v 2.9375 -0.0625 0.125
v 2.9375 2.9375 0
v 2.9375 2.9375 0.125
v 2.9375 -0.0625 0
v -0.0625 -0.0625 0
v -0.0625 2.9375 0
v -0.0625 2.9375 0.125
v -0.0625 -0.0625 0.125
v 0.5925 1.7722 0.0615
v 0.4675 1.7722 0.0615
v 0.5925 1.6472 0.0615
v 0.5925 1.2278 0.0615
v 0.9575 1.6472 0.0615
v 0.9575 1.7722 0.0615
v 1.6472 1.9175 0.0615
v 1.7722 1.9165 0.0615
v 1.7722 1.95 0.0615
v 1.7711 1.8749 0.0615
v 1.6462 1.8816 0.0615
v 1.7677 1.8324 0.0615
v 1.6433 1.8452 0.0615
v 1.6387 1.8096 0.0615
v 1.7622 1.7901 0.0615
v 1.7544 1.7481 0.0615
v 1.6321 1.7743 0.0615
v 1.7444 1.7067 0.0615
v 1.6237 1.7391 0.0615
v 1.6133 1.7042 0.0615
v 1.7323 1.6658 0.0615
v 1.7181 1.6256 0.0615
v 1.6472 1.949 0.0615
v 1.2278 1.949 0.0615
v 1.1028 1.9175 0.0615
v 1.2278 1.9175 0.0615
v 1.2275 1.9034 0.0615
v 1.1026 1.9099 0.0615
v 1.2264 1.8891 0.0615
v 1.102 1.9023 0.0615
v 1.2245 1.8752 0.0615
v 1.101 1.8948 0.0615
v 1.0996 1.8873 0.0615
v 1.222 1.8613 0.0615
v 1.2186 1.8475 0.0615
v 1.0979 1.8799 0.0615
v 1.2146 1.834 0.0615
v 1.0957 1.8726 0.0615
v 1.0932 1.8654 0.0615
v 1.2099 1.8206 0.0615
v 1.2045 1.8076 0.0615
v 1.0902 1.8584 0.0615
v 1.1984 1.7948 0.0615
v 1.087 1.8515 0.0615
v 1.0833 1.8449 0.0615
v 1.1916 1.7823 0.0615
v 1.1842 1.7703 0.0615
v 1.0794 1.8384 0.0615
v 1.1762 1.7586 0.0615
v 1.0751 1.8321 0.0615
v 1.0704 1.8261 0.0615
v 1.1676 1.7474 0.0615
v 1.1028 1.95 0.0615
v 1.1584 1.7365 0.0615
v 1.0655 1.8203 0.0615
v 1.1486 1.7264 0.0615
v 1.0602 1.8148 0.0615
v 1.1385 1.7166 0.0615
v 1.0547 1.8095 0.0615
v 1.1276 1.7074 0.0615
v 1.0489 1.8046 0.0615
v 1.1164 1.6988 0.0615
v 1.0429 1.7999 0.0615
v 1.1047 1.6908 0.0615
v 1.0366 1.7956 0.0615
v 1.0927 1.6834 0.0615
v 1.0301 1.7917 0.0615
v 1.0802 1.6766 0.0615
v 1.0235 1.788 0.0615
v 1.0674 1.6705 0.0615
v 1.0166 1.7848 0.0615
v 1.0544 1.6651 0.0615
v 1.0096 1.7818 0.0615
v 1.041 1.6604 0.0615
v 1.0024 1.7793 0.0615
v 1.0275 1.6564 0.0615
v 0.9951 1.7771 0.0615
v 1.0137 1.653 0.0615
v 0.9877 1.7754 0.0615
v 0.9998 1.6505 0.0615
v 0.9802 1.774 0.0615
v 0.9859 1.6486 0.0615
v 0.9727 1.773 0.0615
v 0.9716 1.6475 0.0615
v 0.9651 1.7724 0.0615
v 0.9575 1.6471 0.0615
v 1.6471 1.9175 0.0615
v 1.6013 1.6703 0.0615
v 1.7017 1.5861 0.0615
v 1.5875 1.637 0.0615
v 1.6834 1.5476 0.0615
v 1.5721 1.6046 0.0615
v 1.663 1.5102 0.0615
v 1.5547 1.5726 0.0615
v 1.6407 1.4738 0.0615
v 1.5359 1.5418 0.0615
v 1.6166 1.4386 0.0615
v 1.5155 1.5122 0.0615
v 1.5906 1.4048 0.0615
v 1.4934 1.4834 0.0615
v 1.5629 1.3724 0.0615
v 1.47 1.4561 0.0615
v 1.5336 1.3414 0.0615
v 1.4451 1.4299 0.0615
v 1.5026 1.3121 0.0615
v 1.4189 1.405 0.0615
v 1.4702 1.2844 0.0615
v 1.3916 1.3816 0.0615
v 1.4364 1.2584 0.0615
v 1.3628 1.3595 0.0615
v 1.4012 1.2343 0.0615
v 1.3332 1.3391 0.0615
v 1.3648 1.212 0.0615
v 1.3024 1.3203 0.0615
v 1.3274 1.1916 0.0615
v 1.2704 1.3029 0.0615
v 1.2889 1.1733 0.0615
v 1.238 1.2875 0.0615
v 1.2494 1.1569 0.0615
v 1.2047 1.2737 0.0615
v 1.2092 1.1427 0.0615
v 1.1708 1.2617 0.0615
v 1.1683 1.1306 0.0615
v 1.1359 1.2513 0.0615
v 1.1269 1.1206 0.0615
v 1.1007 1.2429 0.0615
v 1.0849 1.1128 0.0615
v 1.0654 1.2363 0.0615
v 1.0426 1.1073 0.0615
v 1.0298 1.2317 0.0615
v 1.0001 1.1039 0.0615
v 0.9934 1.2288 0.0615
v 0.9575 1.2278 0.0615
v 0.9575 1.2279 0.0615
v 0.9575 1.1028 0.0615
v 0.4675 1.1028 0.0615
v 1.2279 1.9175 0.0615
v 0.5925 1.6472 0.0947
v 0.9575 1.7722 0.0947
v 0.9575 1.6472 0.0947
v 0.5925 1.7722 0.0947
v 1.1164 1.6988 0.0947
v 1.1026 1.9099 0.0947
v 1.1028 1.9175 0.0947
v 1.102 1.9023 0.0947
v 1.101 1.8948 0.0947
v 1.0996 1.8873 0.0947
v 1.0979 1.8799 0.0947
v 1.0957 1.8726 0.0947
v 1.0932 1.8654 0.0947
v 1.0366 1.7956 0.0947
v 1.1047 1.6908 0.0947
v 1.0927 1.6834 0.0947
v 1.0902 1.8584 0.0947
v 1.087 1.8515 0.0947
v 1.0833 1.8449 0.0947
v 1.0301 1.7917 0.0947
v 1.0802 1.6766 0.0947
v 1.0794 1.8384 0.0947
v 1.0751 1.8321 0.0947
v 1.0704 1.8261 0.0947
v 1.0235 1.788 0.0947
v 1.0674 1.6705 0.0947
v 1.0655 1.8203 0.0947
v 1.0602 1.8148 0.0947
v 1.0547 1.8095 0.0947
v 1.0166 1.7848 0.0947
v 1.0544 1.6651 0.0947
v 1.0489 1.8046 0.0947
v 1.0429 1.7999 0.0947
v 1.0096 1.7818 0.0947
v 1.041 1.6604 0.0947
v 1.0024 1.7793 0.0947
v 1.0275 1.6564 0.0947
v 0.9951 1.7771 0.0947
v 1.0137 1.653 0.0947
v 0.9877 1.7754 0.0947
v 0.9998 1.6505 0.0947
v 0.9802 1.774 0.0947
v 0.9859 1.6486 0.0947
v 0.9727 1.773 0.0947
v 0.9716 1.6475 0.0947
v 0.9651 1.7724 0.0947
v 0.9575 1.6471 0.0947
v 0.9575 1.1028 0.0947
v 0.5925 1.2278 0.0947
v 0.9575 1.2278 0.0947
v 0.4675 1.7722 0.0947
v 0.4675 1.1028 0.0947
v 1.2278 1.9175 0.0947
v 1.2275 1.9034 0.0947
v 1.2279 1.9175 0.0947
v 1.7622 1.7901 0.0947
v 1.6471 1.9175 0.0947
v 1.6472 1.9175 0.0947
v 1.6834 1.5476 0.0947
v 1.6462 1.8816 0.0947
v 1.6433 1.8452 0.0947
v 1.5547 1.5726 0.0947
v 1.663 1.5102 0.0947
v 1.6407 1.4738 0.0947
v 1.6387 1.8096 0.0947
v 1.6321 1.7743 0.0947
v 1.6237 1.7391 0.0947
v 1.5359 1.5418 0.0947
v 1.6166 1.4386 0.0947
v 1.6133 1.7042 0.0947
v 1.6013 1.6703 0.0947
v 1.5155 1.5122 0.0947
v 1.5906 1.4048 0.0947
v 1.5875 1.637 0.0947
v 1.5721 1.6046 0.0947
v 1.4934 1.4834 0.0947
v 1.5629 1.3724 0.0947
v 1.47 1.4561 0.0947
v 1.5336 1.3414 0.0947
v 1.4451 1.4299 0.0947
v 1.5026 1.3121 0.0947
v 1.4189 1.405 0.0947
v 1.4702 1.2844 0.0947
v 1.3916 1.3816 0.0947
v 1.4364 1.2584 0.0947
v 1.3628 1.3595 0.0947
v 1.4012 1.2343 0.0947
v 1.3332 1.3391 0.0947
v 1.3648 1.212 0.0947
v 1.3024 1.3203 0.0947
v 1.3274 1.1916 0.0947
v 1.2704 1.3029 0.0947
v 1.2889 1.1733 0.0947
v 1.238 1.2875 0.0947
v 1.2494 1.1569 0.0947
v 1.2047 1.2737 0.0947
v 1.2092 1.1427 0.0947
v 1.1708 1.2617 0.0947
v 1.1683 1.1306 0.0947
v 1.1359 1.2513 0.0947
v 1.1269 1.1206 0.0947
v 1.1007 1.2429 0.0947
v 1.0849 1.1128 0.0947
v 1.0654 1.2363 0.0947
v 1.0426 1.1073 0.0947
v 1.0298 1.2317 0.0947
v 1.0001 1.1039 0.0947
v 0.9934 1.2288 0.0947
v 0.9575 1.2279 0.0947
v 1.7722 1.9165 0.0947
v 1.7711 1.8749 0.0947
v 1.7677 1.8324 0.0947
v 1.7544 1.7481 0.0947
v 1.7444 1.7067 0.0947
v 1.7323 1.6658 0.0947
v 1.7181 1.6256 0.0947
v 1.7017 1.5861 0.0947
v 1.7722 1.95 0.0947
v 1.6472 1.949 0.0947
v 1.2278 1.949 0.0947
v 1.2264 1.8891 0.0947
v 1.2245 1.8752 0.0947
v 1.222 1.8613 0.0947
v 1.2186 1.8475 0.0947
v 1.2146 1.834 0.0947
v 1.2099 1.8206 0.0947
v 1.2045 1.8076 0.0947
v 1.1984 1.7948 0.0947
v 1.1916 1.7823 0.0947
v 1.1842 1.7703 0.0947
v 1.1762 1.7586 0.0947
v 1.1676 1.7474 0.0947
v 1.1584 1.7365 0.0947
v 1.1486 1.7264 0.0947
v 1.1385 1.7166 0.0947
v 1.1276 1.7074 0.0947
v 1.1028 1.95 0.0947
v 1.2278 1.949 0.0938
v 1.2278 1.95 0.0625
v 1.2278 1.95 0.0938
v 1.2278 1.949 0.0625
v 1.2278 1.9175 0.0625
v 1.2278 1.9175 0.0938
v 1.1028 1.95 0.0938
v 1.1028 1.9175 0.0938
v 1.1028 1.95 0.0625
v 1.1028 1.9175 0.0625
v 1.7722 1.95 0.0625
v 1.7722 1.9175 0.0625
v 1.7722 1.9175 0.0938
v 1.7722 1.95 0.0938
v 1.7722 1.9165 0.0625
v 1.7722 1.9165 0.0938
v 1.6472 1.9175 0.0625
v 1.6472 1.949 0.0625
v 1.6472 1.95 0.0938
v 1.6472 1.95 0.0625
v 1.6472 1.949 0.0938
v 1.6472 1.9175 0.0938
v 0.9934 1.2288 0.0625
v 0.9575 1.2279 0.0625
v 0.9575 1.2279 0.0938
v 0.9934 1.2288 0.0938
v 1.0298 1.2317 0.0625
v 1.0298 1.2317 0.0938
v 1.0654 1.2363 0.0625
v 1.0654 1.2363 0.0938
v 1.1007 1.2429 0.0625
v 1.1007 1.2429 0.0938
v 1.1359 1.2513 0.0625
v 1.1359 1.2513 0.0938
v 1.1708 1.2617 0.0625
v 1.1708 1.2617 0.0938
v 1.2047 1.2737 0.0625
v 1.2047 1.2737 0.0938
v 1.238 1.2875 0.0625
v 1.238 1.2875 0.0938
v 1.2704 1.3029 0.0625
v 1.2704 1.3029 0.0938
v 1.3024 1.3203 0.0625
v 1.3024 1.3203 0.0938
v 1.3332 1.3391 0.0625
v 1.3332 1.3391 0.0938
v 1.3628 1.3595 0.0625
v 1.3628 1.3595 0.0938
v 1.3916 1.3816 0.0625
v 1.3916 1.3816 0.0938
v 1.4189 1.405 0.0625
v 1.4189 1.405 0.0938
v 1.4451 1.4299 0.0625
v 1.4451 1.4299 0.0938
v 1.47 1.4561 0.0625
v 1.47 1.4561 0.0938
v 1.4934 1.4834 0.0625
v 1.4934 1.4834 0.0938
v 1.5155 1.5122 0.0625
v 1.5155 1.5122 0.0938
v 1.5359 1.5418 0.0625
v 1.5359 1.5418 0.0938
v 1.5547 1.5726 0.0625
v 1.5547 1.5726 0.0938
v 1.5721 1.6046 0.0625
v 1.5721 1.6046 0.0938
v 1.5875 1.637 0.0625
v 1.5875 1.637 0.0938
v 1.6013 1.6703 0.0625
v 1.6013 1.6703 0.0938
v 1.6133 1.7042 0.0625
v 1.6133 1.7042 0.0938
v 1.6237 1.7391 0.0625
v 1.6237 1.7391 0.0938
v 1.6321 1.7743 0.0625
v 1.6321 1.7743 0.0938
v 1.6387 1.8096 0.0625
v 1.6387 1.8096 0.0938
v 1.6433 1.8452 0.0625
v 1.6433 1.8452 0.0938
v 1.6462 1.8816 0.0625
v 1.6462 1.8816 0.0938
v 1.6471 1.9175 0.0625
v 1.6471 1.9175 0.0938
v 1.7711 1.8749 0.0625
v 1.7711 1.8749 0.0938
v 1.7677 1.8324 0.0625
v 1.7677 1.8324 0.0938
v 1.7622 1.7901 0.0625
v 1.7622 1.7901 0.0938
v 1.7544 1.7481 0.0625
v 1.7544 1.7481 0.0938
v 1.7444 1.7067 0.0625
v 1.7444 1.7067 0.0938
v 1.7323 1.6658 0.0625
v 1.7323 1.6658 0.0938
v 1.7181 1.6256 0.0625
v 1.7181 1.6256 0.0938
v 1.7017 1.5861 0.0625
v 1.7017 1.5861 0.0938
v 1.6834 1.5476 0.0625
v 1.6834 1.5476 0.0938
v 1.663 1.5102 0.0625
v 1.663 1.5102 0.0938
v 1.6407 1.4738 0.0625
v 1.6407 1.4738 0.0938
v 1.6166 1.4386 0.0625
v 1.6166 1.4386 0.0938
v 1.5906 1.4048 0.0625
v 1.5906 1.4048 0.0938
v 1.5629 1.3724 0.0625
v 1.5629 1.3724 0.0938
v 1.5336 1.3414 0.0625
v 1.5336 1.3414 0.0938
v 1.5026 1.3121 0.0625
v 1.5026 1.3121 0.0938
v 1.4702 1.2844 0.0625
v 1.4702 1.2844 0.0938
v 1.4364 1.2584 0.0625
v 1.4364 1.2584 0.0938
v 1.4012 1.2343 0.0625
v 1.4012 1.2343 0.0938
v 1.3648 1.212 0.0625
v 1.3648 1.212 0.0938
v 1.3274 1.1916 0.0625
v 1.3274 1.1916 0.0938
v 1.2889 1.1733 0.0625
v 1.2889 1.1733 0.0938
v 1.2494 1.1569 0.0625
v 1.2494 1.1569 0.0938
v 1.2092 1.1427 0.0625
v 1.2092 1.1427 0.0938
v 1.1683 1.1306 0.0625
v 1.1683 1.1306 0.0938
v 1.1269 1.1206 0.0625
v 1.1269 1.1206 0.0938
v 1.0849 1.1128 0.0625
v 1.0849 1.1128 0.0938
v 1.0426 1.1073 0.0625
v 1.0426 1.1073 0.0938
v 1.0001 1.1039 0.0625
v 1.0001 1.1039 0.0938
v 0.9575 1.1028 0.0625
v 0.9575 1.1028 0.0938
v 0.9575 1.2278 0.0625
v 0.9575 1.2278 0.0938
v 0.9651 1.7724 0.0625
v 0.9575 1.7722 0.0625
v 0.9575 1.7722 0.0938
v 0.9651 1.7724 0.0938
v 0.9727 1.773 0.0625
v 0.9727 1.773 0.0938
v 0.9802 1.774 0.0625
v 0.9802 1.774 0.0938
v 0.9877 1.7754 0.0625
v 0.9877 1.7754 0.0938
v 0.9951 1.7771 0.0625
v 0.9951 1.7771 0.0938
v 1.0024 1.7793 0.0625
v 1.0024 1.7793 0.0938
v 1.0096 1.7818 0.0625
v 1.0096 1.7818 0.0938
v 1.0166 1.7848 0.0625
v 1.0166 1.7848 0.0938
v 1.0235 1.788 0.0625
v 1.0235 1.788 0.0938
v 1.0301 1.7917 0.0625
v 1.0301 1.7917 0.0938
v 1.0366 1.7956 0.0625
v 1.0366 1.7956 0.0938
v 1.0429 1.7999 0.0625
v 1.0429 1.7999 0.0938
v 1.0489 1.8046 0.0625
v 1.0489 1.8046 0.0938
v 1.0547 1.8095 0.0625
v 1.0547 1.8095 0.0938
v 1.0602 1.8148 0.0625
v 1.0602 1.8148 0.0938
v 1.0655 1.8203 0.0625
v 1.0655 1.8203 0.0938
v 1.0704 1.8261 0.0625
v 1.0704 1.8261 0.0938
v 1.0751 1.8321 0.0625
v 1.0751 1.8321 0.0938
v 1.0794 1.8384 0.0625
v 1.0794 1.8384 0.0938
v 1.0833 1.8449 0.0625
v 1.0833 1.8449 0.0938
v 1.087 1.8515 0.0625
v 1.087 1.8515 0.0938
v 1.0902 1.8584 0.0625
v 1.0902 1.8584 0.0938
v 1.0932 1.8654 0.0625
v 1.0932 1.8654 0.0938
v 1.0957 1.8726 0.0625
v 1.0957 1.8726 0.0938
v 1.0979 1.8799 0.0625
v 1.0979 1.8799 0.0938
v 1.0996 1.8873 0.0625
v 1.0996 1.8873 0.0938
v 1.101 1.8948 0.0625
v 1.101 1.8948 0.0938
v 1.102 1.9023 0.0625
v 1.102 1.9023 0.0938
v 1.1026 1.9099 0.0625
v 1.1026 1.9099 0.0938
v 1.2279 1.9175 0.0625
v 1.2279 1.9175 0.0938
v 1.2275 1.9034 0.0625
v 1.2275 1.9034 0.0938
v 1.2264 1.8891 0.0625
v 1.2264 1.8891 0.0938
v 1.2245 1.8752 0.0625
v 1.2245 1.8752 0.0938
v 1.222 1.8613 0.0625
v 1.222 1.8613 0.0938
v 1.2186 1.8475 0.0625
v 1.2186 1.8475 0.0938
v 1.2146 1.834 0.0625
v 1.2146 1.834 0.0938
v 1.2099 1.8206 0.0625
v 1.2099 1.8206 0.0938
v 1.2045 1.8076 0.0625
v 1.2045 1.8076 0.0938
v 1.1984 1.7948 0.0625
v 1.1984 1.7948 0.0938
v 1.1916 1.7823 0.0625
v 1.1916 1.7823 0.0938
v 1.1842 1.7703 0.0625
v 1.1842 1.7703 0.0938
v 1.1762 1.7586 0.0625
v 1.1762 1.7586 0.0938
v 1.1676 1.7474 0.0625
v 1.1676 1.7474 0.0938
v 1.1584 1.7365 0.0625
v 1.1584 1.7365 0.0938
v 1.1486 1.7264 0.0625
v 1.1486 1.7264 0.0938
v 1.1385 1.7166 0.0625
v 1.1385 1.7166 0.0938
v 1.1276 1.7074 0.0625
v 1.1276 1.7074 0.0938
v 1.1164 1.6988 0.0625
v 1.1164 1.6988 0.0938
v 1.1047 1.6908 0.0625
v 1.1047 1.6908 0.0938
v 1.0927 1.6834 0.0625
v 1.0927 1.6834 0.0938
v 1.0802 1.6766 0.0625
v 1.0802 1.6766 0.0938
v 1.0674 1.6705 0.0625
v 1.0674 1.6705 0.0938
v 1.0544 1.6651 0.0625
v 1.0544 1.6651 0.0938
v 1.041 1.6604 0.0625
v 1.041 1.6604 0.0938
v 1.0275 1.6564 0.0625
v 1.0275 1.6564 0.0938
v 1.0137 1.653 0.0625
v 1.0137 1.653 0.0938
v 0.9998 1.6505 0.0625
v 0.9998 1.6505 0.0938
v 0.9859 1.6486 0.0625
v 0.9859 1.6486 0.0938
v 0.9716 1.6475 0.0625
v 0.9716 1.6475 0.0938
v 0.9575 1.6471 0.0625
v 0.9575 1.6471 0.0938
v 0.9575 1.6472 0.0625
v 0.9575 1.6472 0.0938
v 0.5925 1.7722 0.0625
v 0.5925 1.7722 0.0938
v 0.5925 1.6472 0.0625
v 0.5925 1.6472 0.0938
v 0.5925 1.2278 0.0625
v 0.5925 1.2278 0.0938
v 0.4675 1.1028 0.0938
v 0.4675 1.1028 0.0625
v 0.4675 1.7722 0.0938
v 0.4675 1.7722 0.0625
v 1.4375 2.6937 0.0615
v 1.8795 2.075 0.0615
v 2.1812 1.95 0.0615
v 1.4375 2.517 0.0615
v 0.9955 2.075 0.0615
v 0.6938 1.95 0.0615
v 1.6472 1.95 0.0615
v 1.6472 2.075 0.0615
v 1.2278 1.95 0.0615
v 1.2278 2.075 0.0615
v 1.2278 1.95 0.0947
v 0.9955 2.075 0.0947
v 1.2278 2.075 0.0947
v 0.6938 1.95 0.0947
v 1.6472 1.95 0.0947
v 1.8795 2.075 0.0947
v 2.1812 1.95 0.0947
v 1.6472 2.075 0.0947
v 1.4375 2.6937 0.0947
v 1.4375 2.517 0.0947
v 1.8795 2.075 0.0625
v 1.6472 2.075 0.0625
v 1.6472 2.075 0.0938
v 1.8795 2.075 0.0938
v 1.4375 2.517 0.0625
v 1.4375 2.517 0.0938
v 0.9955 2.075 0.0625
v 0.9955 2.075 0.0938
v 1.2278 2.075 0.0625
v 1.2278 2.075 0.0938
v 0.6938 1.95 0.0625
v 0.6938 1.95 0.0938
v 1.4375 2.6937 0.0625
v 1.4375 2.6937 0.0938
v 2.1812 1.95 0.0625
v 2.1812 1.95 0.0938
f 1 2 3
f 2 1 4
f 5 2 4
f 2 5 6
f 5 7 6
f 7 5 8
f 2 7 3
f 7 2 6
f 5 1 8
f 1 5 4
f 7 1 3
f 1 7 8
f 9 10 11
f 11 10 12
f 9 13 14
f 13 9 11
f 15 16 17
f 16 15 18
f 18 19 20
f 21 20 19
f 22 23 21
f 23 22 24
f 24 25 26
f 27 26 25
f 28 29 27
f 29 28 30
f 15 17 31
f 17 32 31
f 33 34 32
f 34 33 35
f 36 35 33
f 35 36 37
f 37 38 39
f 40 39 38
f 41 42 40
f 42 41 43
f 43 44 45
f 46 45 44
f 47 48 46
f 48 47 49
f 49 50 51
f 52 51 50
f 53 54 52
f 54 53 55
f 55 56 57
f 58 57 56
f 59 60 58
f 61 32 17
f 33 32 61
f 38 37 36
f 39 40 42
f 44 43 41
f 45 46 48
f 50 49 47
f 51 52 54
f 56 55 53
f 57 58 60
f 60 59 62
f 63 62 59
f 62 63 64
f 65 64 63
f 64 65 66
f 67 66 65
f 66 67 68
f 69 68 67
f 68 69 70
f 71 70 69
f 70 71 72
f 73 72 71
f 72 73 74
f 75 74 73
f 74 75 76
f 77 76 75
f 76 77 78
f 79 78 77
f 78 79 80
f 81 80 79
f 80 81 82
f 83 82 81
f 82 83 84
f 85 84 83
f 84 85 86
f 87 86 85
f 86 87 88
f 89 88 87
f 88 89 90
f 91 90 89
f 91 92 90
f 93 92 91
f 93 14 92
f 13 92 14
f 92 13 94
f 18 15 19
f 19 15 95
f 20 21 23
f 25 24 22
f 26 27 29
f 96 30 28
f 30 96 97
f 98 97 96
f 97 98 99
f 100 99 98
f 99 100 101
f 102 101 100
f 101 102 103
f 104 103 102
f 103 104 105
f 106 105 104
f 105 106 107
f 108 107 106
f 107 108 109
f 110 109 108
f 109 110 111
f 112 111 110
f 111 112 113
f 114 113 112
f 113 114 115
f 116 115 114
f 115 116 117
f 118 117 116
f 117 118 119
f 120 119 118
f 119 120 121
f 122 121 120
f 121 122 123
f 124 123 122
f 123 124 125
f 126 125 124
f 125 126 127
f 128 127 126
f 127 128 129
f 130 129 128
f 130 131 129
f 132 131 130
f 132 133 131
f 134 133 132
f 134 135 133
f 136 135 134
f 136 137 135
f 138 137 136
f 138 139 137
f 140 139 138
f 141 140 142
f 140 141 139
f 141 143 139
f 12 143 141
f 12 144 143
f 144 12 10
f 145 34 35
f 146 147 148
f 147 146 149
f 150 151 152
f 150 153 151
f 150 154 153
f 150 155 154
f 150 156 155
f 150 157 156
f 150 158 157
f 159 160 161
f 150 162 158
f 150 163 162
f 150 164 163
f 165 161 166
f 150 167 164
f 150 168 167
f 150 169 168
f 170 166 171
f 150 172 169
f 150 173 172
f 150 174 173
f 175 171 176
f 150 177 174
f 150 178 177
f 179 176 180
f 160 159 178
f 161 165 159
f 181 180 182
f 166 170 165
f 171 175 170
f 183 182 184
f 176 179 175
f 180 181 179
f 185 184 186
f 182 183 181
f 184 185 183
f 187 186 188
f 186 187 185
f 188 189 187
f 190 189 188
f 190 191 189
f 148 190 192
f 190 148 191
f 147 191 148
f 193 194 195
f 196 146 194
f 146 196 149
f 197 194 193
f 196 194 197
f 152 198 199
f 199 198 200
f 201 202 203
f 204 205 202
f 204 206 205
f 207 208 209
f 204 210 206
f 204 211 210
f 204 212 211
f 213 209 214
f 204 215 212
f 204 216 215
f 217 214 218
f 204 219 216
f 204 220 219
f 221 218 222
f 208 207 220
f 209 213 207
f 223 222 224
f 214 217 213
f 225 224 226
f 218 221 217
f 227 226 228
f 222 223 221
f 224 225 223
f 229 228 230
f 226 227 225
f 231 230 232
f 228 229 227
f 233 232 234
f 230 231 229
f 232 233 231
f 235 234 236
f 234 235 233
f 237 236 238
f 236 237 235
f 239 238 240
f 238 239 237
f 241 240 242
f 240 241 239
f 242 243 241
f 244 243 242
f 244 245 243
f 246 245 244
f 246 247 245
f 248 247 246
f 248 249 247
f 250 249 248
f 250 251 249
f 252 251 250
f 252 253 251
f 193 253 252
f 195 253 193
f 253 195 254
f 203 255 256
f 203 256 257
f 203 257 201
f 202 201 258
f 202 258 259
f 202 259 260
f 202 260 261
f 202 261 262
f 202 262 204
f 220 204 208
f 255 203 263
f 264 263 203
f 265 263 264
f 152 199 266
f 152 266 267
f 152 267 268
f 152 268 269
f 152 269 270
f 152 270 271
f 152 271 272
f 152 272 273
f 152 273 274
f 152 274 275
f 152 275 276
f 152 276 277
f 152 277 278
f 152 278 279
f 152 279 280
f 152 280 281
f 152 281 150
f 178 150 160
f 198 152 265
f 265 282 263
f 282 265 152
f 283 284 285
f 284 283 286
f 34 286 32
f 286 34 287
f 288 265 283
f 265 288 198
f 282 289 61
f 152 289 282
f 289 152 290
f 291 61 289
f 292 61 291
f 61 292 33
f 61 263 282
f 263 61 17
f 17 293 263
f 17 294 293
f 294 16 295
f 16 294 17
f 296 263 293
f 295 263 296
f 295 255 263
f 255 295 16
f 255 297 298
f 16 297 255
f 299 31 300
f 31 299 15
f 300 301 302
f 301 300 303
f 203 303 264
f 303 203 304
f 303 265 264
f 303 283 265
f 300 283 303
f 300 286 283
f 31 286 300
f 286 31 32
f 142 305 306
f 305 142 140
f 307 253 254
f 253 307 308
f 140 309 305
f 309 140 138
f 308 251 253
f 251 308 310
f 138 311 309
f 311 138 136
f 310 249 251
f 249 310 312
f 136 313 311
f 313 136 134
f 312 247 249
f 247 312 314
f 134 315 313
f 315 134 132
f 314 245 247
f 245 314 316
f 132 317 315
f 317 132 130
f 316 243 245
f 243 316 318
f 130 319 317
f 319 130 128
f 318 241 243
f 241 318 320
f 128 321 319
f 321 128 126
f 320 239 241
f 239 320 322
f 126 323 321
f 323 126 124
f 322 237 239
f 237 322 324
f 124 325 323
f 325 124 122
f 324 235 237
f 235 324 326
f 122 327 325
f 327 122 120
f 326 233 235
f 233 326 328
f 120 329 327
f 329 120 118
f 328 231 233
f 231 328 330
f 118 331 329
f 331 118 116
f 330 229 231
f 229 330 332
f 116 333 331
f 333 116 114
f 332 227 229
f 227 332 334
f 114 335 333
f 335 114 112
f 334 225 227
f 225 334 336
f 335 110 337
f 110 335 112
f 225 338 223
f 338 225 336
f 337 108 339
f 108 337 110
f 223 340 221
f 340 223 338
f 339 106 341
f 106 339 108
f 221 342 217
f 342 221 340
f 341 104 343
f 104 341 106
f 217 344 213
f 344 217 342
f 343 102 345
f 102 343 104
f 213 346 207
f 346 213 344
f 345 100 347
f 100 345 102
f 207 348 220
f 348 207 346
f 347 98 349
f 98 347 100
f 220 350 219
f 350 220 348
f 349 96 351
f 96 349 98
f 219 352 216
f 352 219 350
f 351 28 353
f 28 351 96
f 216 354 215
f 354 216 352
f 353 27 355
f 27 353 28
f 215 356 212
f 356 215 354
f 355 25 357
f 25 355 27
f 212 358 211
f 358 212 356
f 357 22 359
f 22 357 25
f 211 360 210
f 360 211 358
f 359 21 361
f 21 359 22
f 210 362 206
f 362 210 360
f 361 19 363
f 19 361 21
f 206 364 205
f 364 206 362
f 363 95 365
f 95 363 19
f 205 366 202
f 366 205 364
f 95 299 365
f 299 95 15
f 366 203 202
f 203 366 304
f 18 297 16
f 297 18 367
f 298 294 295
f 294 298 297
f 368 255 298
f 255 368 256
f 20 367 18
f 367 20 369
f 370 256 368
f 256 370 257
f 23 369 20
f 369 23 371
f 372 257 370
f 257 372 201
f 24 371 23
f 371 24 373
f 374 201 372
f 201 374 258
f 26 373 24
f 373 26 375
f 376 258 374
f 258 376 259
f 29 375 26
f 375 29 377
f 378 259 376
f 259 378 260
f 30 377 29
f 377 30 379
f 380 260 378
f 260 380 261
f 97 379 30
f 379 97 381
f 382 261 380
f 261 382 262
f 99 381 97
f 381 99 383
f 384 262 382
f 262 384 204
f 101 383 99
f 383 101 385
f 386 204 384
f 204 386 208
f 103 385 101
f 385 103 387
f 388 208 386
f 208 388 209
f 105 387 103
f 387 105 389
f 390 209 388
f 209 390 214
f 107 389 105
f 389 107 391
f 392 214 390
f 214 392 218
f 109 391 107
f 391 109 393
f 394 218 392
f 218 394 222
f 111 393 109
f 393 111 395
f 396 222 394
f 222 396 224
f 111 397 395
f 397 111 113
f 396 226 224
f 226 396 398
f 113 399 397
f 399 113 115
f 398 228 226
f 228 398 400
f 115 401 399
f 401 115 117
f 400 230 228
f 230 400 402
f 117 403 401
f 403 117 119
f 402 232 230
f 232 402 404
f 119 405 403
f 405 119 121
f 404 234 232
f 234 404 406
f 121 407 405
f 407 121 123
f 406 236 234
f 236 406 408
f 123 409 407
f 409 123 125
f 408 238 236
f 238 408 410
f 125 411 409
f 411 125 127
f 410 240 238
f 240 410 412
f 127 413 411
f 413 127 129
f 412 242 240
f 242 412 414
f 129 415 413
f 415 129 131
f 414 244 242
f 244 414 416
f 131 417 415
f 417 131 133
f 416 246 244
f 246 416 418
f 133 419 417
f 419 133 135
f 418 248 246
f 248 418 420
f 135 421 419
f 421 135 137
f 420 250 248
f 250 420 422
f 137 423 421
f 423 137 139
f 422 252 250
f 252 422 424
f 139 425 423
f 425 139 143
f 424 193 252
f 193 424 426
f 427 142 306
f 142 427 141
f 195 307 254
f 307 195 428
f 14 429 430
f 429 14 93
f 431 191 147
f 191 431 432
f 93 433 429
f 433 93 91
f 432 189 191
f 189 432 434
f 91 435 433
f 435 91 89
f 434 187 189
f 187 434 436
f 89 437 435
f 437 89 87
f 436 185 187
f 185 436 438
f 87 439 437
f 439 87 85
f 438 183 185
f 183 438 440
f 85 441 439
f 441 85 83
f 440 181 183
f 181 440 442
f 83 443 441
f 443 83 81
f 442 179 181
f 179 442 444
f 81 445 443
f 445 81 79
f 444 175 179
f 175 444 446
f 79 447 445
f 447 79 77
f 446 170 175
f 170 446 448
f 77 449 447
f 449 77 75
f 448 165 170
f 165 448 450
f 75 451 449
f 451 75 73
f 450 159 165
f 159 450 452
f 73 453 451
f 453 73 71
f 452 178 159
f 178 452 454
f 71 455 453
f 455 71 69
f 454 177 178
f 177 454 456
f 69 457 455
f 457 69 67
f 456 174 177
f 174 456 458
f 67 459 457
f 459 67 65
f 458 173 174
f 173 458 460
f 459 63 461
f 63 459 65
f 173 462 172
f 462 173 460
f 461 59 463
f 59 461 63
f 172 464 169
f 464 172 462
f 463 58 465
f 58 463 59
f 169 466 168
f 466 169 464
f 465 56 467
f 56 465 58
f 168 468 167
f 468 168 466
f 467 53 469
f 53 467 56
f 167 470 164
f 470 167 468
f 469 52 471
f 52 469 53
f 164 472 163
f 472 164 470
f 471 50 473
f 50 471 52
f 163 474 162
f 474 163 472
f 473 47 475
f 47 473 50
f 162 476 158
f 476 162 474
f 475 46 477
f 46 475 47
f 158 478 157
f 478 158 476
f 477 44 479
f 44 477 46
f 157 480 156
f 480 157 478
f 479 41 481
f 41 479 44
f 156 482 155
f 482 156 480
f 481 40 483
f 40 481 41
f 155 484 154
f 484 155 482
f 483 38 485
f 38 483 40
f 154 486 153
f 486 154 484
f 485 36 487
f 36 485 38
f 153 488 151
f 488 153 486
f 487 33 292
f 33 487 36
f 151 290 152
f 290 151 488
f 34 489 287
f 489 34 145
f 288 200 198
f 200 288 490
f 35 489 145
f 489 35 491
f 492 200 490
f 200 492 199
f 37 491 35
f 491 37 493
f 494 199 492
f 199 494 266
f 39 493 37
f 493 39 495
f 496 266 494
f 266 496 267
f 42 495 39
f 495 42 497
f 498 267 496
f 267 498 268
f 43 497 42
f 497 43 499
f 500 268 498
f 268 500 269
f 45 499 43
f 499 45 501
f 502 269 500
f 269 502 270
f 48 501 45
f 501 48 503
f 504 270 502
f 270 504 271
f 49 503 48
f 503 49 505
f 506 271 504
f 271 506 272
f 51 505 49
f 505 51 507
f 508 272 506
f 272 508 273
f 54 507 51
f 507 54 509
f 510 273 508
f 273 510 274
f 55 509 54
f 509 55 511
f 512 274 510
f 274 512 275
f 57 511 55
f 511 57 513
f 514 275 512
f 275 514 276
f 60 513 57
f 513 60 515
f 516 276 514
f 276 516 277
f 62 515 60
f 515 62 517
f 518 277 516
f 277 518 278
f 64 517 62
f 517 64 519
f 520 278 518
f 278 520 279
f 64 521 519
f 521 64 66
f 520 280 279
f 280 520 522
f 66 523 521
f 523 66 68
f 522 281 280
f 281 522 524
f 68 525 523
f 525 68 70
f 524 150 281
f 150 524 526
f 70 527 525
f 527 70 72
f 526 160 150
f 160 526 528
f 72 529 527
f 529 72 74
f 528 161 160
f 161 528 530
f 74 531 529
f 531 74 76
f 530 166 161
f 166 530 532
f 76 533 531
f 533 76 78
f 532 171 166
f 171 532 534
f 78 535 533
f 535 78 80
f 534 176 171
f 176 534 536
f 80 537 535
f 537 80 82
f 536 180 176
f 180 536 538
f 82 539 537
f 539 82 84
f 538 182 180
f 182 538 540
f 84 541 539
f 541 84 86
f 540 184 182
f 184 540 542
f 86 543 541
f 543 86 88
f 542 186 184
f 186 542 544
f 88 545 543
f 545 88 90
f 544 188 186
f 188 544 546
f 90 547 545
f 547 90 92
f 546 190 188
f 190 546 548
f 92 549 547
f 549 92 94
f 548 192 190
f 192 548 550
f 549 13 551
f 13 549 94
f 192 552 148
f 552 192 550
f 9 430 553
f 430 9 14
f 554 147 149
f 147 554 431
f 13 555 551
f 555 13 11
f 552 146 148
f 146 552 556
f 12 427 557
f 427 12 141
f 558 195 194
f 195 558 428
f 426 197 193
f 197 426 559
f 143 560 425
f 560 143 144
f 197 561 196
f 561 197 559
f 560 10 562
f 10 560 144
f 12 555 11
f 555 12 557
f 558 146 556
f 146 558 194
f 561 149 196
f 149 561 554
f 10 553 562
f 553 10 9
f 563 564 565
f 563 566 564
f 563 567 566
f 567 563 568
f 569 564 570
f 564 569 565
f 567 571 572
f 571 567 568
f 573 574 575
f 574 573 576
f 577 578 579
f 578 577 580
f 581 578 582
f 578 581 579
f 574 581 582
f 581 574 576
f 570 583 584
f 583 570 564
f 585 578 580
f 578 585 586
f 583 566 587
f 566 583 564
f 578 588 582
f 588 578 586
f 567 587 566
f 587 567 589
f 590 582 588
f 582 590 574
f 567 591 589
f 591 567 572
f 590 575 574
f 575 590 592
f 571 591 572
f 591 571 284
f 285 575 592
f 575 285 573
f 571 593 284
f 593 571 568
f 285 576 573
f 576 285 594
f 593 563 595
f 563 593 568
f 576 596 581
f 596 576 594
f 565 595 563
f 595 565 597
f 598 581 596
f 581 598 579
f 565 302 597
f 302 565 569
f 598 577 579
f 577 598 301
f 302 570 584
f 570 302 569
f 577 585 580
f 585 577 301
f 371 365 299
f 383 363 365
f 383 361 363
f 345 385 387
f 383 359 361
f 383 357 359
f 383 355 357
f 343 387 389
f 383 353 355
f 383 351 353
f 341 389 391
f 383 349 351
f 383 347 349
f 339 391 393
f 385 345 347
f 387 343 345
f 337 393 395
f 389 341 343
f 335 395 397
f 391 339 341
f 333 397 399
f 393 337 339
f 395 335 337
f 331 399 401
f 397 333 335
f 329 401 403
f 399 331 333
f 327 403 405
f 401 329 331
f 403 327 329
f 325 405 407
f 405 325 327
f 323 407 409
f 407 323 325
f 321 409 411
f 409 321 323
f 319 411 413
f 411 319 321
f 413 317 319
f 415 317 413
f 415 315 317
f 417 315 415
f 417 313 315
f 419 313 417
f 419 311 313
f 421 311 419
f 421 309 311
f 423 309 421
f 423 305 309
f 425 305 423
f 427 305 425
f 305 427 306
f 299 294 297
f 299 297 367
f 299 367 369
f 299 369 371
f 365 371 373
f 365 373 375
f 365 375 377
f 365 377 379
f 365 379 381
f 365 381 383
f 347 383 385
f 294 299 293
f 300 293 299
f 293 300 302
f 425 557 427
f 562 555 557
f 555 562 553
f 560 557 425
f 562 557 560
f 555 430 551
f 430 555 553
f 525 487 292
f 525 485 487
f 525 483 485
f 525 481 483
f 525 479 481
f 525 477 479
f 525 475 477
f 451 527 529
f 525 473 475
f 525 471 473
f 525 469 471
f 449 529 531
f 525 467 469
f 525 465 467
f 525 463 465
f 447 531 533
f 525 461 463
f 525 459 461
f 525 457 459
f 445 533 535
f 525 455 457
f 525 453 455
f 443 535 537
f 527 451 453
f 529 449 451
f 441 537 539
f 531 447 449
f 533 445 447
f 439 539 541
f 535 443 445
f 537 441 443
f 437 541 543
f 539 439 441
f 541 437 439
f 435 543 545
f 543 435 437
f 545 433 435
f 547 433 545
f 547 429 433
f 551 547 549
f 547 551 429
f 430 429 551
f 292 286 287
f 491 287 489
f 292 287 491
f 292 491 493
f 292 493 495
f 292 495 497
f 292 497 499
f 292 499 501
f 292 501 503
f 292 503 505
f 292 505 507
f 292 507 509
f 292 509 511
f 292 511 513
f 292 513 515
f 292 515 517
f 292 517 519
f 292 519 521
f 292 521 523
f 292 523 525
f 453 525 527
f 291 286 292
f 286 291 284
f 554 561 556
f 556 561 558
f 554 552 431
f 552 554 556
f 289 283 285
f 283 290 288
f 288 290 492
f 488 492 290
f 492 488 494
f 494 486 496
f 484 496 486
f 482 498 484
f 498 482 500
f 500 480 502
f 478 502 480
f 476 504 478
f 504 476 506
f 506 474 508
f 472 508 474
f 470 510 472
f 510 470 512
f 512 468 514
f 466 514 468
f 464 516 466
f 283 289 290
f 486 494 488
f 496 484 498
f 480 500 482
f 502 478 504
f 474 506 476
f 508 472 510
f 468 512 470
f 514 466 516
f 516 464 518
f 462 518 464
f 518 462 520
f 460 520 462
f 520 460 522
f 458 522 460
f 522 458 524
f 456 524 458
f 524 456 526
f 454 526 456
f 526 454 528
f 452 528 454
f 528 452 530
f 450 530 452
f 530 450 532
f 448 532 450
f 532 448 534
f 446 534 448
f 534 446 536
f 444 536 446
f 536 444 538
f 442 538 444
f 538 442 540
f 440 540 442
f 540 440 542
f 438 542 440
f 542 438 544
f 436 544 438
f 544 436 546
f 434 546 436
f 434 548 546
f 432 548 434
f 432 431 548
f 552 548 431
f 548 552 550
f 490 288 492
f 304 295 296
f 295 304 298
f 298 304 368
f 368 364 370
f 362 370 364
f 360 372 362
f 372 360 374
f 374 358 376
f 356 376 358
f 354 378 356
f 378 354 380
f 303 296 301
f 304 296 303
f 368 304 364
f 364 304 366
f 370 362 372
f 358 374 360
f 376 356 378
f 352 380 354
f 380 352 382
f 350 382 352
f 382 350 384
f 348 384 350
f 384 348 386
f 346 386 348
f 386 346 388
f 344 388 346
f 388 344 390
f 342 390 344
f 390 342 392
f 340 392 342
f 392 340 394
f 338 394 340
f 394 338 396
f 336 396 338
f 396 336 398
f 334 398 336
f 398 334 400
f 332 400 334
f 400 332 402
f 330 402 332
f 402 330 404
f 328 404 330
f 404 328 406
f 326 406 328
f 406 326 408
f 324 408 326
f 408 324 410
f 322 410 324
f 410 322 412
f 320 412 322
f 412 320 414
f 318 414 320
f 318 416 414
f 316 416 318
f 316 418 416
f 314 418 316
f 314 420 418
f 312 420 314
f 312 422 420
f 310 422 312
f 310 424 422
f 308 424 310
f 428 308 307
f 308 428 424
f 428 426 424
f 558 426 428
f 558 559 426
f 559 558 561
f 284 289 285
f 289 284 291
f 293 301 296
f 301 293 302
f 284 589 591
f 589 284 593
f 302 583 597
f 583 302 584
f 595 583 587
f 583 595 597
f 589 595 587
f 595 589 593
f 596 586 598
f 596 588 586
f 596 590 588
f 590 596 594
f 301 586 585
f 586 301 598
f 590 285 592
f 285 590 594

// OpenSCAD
// file: sub_water_base_plate.scad
// sub_water_base_plate.scad — base plate for the "water" tile family
// (element55 straight, future right-turn/left-turn variants)
// Units: inches
//
// Unlike sub_base_plate.scad's single darkgray plate, this family stacks the
// top pattern_h-plus a bit into three visible layers, bottom to top:
//   darkgray          — 1/2 plate_h  (structural base)
//   background_color  — 1/4 plate_h  (caller-defined)
//   transparent_color — 1/4 plate_h  (caller-defined, spans the outer
//                                      footprint — frame included — so it
//                                      caps the border too)
// Rivets run through darkgray + background_color only (3/4 plate_h) — the
// transparent_color cap sits over them uncut. frame_with_id() is built to
// that same 3/4 plate_h, so its top 1/4 is covered by the transparent cap
// exactly like the inner plate. The arrow (sub_water_arrows.scad) is
// unaffected — it still lives in its own top pattern_h slice, which happens
// to be the same pattern_h as the transparent_color layer at current
// dimensions, but is not derived from it.

plate_w = 2 + 7/8;
plate_d = 2 + 7/8;
plate_h = 1/8; // full plate thickness
frame_w = 1/16;
hole_d  = 3/32;
hole_r  = hole_d / 2;

pattern_h = 1/32;  // thickness of the arrow's top slice (sub_water_arrows.scad) —
                   // independent of the layer fractions below even though it
                   // currently equals plate_h/4.
id_cover = plate_h * 3 / 16;

// ── Layer heights ───────────────────────────────────────────────────────
darkgray_h    = plate_h / 2;
background_h  = plate_h / 4;
transparent_h = plate_h / 4;
frame_h       = plate_h * 3 / 4;               // = darkgray_h + background_h
rivet_depth   = darkgray_h + background_h;     // rivets stop where the transparent cap starts

module rivet_holes() {
    spacing_x = plate_w / 10;
    spacing_y = plate_d / 10;
    inset_x   = spacing_x / 2;
    inset_y   = spacing_y / 2;
    for (i = [0:9]) translate([inset_x + i * spacing_x, inset_y,           -1]) cylinder(h = rivet_depth + 2, r = hole_r, $fn = 20);
    for (i = [0:9]) translate([inset_x + i * spacing_x, plate_d - inset_y, -1]) cylinder(h = rivet_depth + 2, r = hole_r, $fn = 20);
    for (i = [0:9]) translate([inset_x,           inset_y + i * spacing_y, -1]) cylinder(h = rivet_depth + 2, r = hole_r, $fn = 20);
    for (i = [0:9]) translate([plate_w - inset_x, inset_y + i * spacing_y, -1]) cylinder(h = rivet_depth + 2, r = hole_r, $fn = 20);
}

module rivets() {
    spacing_x = plate_w / 10;
    spacing_y = plate_d / 10;
    inset_x   = spacing_x / 2;
    inset_y   = spacing_y / 2;
    color("lightgray") {
        for (i = [0:9]) translate([inset_x + i * spacing_x, inset_y,           0]) cylinder(h = rivet_depth, r = hole_r, $fn = 20);
        for (i = [0:9]) translate([inset_x + i * spacing_x, plate_d - inset_y, 0]) cylinder(h = rivet_depth, r = hole_r, $fn = 20);
        for (i = [0:9]) translate([inset_x,           inset_y + i * spacing_y, 0]) cylinder(h = rivet_depth, r = hole_r, $fn = 20);
        for (i = [0:9]) translate([plate_w - inset_x, inset_y + i * spacing_y, 0]) cylinder(h = rivet_depth, r = hole_r, $fn = 20);
    }
}

// Border + edge ID marks, built to frame_h (3/4 plate_h) — the transparent
// cap covers the remaining top 1/4, over the frame as well as the plate.
module frame_with_id(colors = []) {
    region_w = plate_w / 8;
    region_d = plate_d / 8;
    mark_h   = frame_h - 2 * id_cover;

    color("black")
    difference() {
        translate([-frame_w, -frame_w, 0])
            cube([plate_w + 2 * frame_w, plate_d + 2 * frame_w, frame_h]);
        translate([0, 0, -0.001])
            cube([plate_w, plate_d, frame_h + 0.002]);
        // top/bottom/left/right straight runs only — corners stay solid black
        translate([0, plate_d - 0.001, -0.001])
            cube([plate_w, frame_w + 0.002, frame_h + 0.002]);
        translate([0, -frame_w - 0.001, -0.001])
            cube([plate_w, frame_w + 0.002, frame_h + 0.002]);
        translate([-frame_w - 0.001, 0, -0.001])
            cube([frame_w + 0.002, plate_d, frame_h + 0.002]);
        translate([plate_w - 0.001, 0, -0.001])
            cube([frame_w + 0.002, plate_d, frame_h + 0.002]);
    }

    for (i = [0:7]) {
        c     = (i == 0) ? "darkgray" : (i == 7) ? "black" : ((colors[i-1] != undef) ? colors[i-1] : "black");

        // top edge — id_cover, mark, id_cover
        color("black") translate([i * region_w, plate_d, 0]) cube([region_w, frame_w, id_cover]);
        color(c)       translate([i * region_w, plate_d, id_cover]) cube([region_w, frame_w, mark_h]);
        color("black") translate([i * region_w, plate_d, id_cover + mark_h]) cube([region_w, frame_w, id_cover]);

        // bottom edge (reversed) — id_cover, mark, id_cover
        color("black") translate([(7-i) * region_w, -frame_w, 0]) cube([region_w, frame_w, id_cover]);
        color(c)       translate([(7-i) * region_w, -frame_w, id_cover]) cube([region_w, frame_w, mark_h]);
        color("black") translate([(7-i) * region_w, -frame_w, id_cover + mark_h]) cube([region_w, frame_w, id_cover]);

        // left edge — id_cover, mark, id_cover
        color("black") translate([-frame_w, i * region_d, 0]) cube([frame_w, region_d, id_cover]);
        color(c)       translate([-frame_w, i * region_d, id_cover]) cube([frame_w, region_d, mark_h]);
        color("black") translate([-frame_w, i * region_d, id_cover + mark_h]) cube([frame_w, region_d, id_cover]);

        // right edge (reversed) — id_cover, mark, id_cover
        color("black") translate([plate_w, (7-i) * region_d, 0]) cube([frame_w, region_d, id_cover]);
        color(c)       translate([plate_w, (7-i) * region_d, id_cover]) cube([frame_w, region_d, mark_h]);
        color("black") translate([plate_w, (7-i) * region_d, id_cover + mark_h]) cube([frame_w, region_d, id_cover]);
    }
}

// Frame + inner darkgray/background_color stack, with rivets running
// through both. Does not include the transparent cap — see
// plate_trans_layer().
module plate(colors = []) {
    frame_with_id(colors);
    union() {
        difference() {
            union() {
                color("darkgray")
                    cube([plate_w, plate_d, darkgray_h]);
                translate([0, 0, darkgray_h])
                color(background_color)
                    cube([plate_w, plate_d, background_h]);
            }
            rivet_holes();
        }
        rivets();
    }
}

// plate() plus the transparent_color cap — spans the full outer footprint
// (frame included) across the top transparent_h slice. plate()'s frame and
// inner stack both already stop exactly at plate_h - transparent_h, so this
// is a plain union, not a cut-and-refill.
module plate_trans_layer(colors = []) {
    plate(colors);
    if (show_transparent) {
        color(transparent_color)
        translate([-frame_w, -frame_w, plate_h - transparent_h])
            cube([plate_w + 2 * frame_w, plate_d + 2 * frame_w, transparent_h]);
    }
}   
// main file
// element55.scad — still water tile
// Units: inches

straight     = false;
left_turn    = true;
right_turn   = false;
double_speed = false;
show_transparent = true;  // if false, the transparent layer is omitted entirely — useful for
                          // debugging the underlying layers

include <sub_water_base_plate.scad>
include <sub_water_arrows.scad>

plate_colors = ["lightblue", "lightblue", undef, undef, undef, undef];

arrow_color  = "black";
background_color = "blue";
transparent_color = "lightblue";

difference() {
    plate_trans_layer(plate_colors);
    arrow_cutout();
}
arrow();
